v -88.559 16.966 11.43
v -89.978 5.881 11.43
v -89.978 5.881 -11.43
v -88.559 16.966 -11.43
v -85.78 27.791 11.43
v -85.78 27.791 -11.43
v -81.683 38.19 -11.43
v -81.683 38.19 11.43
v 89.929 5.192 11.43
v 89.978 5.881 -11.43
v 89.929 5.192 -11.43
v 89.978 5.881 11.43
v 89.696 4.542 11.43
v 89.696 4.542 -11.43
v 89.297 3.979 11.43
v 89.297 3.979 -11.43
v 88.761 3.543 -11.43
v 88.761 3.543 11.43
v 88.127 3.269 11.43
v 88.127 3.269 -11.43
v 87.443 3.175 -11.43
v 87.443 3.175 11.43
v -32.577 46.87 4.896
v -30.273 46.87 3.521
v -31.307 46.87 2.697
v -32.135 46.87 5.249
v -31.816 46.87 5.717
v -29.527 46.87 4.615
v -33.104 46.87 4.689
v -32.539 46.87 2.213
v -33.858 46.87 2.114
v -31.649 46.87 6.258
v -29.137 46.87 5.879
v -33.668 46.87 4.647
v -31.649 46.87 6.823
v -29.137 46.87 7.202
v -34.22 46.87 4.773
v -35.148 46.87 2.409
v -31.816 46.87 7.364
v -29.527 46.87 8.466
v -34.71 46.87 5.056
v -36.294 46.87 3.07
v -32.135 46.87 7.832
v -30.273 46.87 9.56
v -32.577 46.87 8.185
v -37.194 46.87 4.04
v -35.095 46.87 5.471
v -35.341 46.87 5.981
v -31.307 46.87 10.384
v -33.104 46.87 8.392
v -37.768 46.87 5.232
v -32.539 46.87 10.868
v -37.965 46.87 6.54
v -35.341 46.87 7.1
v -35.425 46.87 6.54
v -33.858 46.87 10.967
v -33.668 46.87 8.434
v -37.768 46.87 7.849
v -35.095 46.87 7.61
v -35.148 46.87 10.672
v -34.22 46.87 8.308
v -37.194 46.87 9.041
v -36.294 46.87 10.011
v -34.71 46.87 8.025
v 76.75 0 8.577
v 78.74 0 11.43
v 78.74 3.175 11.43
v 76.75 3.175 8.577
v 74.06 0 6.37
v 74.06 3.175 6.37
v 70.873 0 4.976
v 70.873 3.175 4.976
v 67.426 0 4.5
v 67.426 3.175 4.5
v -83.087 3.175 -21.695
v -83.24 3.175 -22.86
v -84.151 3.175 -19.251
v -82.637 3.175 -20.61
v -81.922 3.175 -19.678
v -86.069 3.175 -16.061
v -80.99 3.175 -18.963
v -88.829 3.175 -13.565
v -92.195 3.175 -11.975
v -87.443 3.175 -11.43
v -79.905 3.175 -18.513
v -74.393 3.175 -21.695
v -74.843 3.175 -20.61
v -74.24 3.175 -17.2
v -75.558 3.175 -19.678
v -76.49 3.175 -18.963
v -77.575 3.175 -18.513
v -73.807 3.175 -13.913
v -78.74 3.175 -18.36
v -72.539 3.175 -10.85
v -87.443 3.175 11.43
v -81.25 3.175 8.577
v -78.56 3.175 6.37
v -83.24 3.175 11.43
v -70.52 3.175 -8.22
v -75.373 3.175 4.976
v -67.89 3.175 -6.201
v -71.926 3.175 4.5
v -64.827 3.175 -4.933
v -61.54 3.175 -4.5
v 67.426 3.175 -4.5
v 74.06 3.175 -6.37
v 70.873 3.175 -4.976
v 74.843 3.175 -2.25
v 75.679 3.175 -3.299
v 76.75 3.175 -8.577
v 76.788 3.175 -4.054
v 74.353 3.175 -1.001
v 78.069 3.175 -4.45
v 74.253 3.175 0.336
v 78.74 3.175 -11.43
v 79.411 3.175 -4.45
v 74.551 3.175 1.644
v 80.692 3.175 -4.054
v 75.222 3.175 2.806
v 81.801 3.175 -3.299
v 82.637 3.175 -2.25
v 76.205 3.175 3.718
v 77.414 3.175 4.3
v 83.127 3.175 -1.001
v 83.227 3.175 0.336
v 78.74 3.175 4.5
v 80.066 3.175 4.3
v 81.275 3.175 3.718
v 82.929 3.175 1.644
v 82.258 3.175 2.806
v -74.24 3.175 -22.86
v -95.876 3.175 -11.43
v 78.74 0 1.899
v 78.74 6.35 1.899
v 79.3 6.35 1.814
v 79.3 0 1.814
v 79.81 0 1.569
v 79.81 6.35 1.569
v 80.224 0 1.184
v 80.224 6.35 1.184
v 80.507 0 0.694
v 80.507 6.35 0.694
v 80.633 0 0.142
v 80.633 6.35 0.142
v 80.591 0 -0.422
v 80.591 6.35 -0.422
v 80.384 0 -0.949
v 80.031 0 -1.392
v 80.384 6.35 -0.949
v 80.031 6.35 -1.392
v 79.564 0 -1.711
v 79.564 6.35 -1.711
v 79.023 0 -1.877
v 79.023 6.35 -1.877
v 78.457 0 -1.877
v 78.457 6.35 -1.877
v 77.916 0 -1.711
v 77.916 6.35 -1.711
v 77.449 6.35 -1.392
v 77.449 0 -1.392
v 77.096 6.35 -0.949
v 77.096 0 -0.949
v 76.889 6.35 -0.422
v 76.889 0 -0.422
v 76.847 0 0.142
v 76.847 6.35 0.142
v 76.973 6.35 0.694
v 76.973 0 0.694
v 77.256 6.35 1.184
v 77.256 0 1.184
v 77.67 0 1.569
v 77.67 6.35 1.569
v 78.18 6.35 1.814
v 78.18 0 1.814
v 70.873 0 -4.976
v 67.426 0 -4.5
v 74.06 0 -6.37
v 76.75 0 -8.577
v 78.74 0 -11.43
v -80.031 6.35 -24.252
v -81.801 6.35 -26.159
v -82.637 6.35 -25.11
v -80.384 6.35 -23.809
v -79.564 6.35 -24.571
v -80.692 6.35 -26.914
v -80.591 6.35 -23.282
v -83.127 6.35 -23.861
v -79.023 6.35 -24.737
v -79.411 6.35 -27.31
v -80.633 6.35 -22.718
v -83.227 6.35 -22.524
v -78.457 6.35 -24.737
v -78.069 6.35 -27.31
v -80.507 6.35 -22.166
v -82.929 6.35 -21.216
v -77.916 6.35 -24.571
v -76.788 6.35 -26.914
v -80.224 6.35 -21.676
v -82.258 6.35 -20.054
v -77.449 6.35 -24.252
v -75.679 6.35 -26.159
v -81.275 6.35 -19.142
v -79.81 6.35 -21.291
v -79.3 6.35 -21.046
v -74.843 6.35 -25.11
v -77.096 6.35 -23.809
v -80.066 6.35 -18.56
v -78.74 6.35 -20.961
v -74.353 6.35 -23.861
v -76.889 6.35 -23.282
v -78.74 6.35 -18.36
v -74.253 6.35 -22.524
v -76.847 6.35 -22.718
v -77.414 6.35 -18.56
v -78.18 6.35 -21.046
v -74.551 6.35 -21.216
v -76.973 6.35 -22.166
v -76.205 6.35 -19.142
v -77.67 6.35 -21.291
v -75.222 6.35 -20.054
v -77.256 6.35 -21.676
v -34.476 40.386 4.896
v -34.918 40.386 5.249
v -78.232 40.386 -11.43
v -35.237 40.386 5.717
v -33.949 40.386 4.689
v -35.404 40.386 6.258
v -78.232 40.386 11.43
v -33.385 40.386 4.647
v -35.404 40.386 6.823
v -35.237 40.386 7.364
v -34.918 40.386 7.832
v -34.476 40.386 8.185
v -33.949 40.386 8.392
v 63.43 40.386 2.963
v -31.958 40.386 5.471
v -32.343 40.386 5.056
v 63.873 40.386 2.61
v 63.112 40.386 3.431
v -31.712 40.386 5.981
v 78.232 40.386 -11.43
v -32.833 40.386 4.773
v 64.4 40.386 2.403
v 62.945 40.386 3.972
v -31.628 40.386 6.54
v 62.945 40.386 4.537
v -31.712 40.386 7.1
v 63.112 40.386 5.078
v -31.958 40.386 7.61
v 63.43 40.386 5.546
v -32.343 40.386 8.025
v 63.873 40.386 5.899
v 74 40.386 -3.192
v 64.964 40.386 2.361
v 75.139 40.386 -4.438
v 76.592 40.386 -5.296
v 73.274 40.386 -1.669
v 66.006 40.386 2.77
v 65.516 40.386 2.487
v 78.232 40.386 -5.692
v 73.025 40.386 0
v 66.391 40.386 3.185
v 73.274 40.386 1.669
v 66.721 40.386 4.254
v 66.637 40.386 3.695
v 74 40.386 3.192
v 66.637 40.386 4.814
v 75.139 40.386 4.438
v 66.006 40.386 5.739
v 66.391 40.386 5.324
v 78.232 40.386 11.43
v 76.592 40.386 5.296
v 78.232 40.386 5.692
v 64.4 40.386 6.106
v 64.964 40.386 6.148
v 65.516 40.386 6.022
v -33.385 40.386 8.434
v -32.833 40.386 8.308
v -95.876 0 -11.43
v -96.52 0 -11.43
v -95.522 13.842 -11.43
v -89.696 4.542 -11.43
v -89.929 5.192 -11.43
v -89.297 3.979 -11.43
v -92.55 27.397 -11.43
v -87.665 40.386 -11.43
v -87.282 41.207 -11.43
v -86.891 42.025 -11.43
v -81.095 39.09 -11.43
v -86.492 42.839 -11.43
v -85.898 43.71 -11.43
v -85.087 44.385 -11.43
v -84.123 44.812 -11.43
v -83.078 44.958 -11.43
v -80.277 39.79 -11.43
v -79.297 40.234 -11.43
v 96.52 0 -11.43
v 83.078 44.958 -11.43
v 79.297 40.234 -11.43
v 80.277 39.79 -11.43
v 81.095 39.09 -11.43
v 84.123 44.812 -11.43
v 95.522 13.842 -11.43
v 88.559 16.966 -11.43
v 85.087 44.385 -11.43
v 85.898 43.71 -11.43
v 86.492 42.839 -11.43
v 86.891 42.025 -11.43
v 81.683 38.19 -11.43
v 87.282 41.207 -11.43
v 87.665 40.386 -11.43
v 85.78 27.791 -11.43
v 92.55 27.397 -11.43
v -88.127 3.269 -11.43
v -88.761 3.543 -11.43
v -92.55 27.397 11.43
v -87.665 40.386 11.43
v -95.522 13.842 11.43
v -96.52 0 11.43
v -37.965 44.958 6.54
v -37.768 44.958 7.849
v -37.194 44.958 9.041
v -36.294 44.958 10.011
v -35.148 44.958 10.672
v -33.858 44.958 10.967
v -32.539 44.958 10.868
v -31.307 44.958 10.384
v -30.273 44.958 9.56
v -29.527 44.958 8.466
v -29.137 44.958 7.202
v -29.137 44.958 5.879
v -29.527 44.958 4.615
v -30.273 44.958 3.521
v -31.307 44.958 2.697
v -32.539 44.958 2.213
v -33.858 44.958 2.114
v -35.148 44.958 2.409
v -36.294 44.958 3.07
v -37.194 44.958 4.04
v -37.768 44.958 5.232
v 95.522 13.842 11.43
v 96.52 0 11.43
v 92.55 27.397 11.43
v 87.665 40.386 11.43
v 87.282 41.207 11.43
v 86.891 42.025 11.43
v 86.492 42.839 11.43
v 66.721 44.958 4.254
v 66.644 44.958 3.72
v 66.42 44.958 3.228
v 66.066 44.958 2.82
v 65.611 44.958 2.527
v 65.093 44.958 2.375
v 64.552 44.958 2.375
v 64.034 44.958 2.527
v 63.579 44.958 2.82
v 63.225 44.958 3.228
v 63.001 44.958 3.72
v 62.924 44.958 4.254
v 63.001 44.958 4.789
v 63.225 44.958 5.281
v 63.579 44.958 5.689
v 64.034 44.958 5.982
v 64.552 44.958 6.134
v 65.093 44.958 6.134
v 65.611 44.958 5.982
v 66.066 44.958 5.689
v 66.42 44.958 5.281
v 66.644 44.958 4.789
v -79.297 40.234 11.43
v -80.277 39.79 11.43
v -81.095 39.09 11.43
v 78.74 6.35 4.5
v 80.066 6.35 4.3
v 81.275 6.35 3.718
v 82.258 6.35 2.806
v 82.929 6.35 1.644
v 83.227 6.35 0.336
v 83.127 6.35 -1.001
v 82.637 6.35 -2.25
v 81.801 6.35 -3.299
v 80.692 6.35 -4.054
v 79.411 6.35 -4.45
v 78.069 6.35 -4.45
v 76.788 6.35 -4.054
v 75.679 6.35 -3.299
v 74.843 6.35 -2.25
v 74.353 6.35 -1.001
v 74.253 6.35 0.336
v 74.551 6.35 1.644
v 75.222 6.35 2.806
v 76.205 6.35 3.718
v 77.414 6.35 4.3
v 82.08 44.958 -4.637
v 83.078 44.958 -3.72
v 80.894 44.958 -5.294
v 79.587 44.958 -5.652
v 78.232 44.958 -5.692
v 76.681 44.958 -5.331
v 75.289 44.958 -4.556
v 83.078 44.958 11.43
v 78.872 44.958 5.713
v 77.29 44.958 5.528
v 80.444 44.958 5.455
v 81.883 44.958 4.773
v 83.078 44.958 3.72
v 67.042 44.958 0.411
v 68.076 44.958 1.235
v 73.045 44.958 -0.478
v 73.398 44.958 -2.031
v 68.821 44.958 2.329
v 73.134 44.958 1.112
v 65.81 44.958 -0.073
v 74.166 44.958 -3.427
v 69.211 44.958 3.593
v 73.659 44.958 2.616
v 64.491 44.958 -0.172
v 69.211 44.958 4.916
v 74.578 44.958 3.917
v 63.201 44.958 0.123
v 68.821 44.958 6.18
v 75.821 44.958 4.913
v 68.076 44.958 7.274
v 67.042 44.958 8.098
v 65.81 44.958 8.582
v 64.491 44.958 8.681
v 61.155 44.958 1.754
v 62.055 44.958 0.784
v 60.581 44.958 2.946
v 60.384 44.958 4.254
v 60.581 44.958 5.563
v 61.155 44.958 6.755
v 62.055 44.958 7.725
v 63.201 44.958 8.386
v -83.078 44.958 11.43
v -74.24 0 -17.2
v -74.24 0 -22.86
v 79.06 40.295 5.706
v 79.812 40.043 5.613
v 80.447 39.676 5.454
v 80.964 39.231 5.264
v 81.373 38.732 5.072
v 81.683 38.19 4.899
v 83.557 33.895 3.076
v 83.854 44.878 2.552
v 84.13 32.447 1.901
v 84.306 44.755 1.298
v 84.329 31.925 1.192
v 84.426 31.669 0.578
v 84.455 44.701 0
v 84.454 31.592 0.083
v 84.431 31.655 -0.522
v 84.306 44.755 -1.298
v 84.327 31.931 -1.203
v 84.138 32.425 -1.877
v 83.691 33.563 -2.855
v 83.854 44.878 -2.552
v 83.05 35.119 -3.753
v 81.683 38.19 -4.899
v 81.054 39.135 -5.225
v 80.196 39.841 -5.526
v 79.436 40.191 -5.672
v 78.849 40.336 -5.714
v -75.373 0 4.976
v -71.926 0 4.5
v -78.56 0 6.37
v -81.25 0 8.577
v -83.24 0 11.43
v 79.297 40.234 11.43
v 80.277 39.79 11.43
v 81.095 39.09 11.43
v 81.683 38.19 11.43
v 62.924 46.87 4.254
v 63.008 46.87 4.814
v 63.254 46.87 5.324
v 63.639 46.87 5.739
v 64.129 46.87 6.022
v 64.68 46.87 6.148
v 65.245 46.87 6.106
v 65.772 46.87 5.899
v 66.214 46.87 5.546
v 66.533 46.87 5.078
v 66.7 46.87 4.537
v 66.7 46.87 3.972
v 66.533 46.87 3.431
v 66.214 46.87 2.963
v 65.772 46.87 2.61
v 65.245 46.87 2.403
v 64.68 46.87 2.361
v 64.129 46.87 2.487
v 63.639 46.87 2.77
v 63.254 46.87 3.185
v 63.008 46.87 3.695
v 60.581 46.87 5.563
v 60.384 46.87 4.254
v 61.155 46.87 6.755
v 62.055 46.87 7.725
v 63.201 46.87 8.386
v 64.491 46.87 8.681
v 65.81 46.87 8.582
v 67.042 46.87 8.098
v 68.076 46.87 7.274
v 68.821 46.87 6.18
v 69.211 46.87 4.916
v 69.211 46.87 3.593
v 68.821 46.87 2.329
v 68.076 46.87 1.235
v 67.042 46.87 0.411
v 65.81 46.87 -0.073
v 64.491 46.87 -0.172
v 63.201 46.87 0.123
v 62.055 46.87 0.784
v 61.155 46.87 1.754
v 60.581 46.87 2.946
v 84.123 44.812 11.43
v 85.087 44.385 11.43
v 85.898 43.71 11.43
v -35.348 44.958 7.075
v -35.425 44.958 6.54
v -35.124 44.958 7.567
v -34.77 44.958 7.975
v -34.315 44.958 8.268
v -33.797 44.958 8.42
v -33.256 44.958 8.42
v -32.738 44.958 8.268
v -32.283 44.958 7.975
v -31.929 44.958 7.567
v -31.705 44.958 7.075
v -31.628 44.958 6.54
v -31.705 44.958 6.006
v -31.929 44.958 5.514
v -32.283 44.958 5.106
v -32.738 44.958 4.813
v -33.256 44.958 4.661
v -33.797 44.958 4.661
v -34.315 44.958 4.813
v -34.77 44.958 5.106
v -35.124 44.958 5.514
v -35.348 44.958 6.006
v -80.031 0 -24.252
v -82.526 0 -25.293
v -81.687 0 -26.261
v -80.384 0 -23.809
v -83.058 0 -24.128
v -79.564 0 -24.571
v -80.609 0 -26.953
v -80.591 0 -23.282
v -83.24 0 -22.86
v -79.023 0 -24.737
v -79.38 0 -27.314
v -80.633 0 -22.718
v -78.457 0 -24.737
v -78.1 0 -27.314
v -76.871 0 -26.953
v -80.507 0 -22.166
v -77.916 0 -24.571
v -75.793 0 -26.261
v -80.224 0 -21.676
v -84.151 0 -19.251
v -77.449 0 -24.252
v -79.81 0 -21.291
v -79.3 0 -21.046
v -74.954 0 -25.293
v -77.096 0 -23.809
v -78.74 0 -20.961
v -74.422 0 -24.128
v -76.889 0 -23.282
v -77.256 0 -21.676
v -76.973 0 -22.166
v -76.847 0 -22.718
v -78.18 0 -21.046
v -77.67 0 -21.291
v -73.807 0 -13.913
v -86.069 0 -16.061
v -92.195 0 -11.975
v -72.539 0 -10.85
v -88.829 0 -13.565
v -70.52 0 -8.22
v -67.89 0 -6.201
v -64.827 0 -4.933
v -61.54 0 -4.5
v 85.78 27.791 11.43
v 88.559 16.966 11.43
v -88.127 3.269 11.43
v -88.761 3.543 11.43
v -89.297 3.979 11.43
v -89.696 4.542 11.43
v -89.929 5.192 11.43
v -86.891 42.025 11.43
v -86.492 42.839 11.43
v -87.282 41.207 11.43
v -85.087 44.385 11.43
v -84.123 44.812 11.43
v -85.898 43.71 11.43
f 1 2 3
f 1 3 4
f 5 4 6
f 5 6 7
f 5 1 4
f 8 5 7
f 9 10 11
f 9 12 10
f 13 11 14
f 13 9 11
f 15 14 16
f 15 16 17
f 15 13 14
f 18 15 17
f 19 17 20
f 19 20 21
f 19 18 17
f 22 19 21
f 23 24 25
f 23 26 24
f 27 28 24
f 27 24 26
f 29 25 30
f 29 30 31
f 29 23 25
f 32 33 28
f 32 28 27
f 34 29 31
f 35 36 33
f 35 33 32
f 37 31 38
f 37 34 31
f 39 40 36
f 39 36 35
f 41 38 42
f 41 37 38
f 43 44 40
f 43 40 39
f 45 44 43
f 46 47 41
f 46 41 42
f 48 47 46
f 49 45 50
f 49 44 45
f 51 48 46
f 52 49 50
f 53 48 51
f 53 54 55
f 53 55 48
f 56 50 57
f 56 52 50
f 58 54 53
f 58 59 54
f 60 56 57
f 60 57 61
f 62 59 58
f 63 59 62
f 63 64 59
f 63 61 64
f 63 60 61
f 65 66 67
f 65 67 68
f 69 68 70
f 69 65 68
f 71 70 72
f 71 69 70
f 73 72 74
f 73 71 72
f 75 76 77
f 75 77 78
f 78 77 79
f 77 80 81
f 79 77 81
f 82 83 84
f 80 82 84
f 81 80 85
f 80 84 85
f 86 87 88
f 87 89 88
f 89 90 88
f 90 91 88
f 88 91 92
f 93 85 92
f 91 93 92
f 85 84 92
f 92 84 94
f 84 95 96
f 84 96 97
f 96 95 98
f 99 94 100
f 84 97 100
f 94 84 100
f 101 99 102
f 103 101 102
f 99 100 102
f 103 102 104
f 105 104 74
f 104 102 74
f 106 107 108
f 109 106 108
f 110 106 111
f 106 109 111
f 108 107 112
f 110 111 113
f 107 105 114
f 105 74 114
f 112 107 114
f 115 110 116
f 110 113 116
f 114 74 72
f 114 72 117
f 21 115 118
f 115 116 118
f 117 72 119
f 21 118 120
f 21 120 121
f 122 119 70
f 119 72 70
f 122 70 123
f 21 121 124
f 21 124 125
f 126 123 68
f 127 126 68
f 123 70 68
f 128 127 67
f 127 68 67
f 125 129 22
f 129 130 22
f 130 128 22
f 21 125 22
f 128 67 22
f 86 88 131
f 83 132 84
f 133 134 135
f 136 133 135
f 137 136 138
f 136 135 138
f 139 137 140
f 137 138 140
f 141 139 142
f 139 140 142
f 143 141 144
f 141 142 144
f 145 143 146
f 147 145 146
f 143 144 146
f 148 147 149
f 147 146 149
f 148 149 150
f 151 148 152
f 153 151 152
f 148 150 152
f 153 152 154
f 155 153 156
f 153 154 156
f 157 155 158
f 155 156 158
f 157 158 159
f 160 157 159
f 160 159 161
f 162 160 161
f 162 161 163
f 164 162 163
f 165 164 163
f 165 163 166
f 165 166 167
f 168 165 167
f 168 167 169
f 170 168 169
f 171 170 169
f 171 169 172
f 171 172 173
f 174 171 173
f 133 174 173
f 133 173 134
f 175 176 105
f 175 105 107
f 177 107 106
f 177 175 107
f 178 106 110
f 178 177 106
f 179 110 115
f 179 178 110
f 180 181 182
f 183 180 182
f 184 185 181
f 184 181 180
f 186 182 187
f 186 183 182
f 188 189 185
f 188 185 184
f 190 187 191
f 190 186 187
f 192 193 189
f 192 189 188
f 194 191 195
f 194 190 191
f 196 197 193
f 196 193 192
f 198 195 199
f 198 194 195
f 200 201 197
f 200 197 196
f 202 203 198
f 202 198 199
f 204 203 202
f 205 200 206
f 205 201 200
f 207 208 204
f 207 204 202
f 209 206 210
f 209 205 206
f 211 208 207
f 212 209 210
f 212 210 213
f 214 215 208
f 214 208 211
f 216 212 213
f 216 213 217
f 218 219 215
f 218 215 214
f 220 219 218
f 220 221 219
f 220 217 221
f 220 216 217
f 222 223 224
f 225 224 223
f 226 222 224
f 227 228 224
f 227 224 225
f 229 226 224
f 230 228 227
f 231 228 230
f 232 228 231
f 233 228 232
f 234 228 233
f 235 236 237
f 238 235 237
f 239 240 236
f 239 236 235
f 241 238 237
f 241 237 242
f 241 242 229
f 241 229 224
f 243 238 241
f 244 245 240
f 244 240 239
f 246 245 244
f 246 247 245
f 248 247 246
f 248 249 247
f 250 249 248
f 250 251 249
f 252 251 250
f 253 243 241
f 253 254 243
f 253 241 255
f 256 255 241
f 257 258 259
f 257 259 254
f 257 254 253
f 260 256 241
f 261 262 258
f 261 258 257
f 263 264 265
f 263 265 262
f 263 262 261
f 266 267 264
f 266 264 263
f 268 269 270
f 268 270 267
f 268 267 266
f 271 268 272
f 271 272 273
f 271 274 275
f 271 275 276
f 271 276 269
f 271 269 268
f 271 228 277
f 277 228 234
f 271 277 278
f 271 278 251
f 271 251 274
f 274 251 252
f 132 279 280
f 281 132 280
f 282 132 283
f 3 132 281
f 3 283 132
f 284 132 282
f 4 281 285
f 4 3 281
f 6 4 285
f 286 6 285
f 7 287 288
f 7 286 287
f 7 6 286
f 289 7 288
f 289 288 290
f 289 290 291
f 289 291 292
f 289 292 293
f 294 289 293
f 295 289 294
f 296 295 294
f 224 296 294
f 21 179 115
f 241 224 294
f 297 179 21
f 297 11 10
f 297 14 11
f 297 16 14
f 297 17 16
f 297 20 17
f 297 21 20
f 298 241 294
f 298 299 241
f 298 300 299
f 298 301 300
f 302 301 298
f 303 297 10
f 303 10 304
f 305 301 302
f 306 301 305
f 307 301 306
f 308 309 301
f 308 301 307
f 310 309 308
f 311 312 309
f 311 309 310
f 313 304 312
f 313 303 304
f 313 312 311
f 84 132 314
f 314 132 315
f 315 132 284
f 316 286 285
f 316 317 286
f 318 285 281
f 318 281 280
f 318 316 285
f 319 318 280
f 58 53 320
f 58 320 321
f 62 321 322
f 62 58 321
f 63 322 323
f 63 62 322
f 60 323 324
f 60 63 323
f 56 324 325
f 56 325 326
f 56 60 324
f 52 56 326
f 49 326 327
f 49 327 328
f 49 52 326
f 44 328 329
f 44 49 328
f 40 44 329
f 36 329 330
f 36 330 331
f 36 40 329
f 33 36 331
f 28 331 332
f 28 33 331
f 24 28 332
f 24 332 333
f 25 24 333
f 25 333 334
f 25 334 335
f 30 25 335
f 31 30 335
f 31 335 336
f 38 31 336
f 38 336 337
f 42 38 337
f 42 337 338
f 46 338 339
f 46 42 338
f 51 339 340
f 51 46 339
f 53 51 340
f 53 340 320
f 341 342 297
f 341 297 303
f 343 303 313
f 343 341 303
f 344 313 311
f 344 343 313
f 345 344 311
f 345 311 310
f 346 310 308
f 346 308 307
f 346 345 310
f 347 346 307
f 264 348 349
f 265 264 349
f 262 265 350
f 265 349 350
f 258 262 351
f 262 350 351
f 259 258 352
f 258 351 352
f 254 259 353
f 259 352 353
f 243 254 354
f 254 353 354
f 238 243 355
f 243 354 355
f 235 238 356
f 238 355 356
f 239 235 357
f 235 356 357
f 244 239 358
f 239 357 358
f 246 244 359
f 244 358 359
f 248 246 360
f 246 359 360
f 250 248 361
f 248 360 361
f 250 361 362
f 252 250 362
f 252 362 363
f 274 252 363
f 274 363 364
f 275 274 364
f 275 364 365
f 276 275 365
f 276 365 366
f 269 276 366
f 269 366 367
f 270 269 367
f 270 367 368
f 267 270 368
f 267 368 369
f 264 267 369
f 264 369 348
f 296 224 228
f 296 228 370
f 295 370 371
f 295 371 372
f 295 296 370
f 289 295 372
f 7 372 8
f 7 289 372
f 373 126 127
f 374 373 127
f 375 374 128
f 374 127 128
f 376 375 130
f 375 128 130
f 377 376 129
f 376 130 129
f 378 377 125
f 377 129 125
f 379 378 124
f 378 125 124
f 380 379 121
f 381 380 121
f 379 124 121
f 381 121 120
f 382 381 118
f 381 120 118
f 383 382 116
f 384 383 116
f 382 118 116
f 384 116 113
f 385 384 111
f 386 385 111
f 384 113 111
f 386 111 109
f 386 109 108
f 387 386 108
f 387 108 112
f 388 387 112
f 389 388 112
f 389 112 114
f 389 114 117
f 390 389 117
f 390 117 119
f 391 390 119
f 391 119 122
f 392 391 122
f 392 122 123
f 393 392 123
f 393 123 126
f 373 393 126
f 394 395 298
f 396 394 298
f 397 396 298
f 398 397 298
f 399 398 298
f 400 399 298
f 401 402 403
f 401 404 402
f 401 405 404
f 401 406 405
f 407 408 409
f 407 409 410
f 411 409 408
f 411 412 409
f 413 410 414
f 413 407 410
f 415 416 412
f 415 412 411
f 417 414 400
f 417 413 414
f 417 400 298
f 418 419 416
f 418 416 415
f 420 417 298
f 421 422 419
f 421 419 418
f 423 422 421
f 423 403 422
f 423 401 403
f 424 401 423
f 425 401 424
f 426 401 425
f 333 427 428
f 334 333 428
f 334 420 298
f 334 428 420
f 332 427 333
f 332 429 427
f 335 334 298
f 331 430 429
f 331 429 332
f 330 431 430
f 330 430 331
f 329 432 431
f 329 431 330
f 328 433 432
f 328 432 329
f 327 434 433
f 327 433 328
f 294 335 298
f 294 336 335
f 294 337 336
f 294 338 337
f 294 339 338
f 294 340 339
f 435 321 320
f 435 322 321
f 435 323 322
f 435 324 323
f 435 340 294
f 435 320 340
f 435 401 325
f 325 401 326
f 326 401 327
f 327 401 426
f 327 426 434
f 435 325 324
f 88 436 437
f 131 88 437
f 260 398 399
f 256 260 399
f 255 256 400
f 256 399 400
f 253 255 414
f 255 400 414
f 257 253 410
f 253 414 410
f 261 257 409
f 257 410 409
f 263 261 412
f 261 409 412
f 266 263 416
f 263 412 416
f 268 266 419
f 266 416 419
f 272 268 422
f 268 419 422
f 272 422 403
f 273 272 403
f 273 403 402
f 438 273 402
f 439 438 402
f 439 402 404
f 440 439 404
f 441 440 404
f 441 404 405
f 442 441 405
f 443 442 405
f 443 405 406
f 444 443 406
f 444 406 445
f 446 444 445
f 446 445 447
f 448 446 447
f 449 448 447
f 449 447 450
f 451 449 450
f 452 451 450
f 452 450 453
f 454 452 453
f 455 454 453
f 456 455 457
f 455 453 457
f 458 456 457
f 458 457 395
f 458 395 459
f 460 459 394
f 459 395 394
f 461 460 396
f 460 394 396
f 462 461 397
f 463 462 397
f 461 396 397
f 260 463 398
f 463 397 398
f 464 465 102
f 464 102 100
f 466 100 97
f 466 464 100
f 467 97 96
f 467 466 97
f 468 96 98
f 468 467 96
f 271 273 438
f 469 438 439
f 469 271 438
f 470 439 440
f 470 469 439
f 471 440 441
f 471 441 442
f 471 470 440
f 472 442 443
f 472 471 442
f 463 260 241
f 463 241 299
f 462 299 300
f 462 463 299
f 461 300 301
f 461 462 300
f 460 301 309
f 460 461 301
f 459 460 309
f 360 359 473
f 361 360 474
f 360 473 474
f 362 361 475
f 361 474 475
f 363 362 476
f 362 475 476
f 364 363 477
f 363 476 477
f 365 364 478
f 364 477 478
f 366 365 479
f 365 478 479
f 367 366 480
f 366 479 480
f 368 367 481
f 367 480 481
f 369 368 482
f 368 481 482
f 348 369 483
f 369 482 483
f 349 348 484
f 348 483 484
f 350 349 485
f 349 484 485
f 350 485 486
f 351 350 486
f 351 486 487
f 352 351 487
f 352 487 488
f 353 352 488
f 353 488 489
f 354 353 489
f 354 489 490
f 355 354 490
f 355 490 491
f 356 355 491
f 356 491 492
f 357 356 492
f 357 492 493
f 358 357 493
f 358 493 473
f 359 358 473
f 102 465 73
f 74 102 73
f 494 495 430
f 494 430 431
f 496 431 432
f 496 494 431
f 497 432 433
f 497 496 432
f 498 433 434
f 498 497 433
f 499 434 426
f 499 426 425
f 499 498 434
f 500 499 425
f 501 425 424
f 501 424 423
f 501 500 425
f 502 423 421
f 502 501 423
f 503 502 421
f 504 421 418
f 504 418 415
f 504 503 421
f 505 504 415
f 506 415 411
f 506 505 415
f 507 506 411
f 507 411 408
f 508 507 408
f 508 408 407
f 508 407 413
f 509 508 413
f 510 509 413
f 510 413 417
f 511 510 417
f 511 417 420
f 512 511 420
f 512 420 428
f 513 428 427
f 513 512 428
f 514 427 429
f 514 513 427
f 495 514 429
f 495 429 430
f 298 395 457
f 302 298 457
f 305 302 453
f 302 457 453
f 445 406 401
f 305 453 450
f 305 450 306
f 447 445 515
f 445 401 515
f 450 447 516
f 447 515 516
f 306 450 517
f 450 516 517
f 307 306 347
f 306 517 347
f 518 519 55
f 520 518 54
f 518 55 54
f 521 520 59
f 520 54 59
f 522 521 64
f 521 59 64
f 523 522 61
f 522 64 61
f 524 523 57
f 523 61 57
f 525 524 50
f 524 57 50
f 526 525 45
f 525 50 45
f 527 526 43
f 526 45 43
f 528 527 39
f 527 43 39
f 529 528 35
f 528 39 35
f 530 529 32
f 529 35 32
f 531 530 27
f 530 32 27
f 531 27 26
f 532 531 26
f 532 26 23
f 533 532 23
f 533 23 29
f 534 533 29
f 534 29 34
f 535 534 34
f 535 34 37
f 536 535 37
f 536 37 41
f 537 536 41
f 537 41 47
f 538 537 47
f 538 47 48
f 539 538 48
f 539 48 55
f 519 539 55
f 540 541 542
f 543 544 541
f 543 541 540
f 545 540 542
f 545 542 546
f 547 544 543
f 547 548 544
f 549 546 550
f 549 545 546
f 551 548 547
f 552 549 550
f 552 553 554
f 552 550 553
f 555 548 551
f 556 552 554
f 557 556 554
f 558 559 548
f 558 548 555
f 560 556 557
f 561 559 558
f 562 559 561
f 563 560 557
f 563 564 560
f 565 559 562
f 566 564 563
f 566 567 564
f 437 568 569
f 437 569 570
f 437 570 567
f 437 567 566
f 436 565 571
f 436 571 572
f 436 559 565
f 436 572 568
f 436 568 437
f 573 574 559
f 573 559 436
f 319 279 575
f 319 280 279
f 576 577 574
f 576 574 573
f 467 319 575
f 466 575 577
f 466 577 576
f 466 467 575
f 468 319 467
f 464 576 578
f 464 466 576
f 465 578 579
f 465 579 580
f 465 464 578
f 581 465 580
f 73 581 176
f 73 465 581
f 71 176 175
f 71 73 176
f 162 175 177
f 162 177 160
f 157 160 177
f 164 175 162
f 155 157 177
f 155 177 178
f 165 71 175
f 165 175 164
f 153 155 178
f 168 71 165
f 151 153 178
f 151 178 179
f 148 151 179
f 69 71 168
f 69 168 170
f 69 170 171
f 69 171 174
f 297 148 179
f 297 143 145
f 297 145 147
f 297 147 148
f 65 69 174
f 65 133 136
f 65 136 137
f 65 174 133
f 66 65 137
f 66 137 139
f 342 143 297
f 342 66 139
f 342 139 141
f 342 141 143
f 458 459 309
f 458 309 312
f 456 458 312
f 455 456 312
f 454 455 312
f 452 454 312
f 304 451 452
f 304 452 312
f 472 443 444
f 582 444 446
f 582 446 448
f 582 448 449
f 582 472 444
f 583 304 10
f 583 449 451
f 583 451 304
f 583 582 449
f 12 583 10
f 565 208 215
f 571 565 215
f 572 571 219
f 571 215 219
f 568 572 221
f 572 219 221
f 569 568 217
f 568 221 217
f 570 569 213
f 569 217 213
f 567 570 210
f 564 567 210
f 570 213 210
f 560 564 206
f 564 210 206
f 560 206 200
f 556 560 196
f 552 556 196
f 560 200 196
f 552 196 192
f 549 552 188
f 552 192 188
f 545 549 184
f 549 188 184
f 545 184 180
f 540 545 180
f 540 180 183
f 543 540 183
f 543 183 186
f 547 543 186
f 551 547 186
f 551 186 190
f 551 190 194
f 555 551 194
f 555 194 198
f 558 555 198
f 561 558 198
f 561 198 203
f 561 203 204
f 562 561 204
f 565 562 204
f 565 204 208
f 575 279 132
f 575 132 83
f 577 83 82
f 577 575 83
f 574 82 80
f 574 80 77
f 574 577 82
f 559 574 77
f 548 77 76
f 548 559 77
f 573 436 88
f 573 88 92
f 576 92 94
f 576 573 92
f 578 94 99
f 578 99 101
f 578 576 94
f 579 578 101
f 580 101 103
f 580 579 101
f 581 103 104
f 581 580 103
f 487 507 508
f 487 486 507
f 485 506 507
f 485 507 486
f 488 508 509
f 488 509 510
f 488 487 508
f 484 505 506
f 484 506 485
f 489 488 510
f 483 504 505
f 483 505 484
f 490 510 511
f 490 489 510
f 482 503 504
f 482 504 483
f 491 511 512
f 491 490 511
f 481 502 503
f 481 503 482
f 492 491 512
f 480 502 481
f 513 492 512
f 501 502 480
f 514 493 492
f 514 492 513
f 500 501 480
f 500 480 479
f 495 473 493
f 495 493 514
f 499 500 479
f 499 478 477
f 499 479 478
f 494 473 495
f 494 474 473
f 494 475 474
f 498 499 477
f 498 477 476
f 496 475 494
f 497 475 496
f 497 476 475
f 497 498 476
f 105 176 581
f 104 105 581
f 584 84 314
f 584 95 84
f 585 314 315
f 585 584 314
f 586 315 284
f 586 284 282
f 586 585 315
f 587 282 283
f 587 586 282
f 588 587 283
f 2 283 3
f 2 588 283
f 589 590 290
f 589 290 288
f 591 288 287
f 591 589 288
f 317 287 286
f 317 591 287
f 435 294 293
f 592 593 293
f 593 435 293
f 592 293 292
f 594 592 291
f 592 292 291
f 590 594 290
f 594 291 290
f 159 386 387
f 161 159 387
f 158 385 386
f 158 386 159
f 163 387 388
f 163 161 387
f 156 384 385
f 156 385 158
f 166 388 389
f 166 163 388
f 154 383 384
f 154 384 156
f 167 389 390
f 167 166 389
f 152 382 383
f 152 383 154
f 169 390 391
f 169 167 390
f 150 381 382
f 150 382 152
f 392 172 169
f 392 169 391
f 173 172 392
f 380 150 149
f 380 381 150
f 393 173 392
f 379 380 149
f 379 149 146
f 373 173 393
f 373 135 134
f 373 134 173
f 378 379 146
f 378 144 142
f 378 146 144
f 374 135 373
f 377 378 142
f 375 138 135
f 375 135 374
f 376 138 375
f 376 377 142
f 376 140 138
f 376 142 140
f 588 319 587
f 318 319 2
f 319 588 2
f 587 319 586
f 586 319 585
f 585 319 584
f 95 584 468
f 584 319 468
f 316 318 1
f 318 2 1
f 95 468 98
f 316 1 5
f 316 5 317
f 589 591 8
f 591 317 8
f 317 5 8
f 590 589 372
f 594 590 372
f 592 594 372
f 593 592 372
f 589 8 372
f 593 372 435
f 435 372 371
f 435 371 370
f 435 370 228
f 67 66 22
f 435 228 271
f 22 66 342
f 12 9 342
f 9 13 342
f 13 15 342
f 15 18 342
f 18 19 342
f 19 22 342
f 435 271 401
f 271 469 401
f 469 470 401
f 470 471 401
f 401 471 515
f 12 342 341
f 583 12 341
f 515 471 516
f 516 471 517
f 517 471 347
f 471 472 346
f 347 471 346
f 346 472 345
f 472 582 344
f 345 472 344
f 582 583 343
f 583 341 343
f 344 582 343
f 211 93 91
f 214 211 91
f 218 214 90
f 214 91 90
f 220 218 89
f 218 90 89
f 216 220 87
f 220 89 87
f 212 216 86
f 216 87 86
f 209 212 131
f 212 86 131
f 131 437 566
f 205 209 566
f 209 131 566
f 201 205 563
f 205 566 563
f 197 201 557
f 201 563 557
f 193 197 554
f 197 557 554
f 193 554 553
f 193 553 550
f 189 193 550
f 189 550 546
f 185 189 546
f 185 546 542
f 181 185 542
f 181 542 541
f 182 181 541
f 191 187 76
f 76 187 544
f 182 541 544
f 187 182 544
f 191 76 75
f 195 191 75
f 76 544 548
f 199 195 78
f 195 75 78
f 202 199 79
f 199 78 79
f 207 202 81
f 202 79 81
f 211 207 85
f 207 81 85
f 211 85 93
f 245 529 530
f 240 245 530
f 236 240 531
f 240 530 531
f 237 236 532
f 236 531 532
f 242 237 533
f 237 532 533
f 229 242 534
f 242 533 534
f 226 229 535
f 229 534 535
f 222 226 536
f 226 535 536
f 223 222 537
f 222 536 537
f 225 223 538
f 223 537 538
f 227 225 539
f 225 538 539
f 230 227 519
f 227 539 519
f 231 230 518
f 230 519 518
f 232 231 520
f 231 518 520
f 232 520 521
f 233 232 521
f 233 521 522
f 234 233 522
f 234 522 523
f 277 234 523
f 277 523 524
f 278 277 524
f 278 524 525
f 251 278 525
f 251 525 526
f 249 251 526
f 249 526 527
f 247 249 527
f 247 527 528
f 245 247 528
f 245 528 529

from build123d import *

# Parameters (mm, degrees)
SKETCH1_R                  = 4.5
BOSS_EXTRUDE1_DEPTH        = 6.35
BOSS_EXTRUDE1_2_DEPTH      = 6.35
BOSS_EXTRUDE2_DEPTH        = 3.175
SKETCH5_W                  = 4.5
SKETCH5_H                  = 3.175
BOSS_EXTRUDE3_DEPTH        = 11.43
F_6_CLEARANCE_HOLE1_D      = 3.7973
FILLET1_R                  = 2.54
FILLET2_R                  = 3.81
FILLET3_R                  = 12.7
CUT_EXTRUDE1_REACH         = 111.936
SKETCH10_R                 = 5.715
F_6_CLEARANCE_HOLE2_REACH  = 143.713
F_6_CLEARANCE_HOLE2_BORE_R = 1.89865
BOSS_EXTRUDE5_START        = 1.912
SKETCH13_R                 = 4.43865
SKETCH13_R_2               = 1.89865
BOSS_EXTRUDE5_DEPTH        = 1.912


with BuildPart() as part:
    # Sketch1 → Boss-Extrude1 (new body)
    with BuildSketch(Plane(origin=(0, 0, 0), x_dir=(1, 0, 0), z_dir=(0, 1, 0))):
        with Locations(Location((78.74, 0, 0), (0, 0, 270))):
            Circle(SKETCH1_R)
    extrude(amount=BOSS_EXTRUDE1_DEPTH)



with BuildPart() as body_2:
    # Sketch1 → Boss-Extrude1 2 (new body)
    with BuildSketch(Plane(origin=(0, 0, 0), x_dir=(1, 0, 0), z_dir=(0, 1, 0))):
        with Locations(Location((-78.74, 22.86, 0), (0, 0, 270))):
            Circle(SKETCH1_R)
    extrude(amount=BOSS_EXTRUDE1_2_DEPTH)


with BuildPart() as part_1:
    add(part.part)

    add(body_2.part)  # Boss-Extrude2 merges body 2
    # Sketch2 → Boss-Extrude2 (add)
    with BuildSketch(Plane(origin=(0, 0, 0), x_dir=(1, 0, 0), z_dir=(0, 1, 0))):
        with BuildLine():
            ThreePointArc((-74.24, 22.86), (-78.74, 18.36), (-83.24, 22.86))
            Line((-83.24, 22.86), (-83.24, -4.5))
            Line((-83.24, -4.5), (78.74, -4.5))
            ThreePointArc((78.74, -4.5), (74.24, 0), (78.74, 4.5))
            Line((78.74, 4.5), (-74.24, 4.5))
            Line((-74.24, 4.5), (-74.24, 22.86))
        make_face()
    extrude(amount=BOSS_EXTRUDE2_DEPTH)

    # Sketch5 → Boss-Extrude3 (add, symmetric)
    with BuildSketch(Plane.XY):
        with BuildLine():
            ThreePointArc((-90.114084776, 3.175), (-87.371075104, 22.291795245), (-80.620096155, 40.386))
            Line((-80.620096155, 40.386), (-87.664596069, 40.386))
            ThreePointArc((-87.664596069, 40.386), (-94.280160195, 20.672730678), (-96.52, 0))
            Line((-96.52, 0), (-83.24, 0))
            Line((-83.24, 0), (-83.24, 3.175))
            Line((-83.24, 3.175), (-90.114084776, 3.175))
        make_face()
        with BuildLine():
            Line((80.620096155, 40.386), (87.664596069, 40.386))
            ThreePointArc((87.664596069, 40.386), (86.567546752, 42.686886152), (85.41012022, 44.958))
            Line((85.41012022, 44.958), (78.162696576, 44.958))
            ThreePointArc((78.162696576, 44.958), (79.424301148, 42.689685958), (80.620096155, 40.386))
        make_face()
        with BuildLine():
            Line((-87.664596069, 40.386), (-80.620096155, 40.386))
            ThreePointArc((-80.620096155, 40.386), (-79.424301148, 42.689685958), (-78.162696576, 44.958))
            Line((-78.162696576, 44.958), (-85.41012022, 44.958))
            ThreePointArc((-85.41012022, 44.958), (-86.567546752, 42.686886152), (-87.664596069, 40.386))
        make_face()
        with BuildLine():
            Line((-80.620096155, 40.386), (80.620096155, 40.386))
            ThreePointArc((80.620096155, 40.386), (79.424301148, 42.689685958), (78.162696576, 44.958))
            Line((78.162696576, 44.958), (-78.162696576, 44.958))
            ThreePointArc((-78.162696576, 44.958), (-79.424301148, 42.689685958), (-80.620096155, 40.386))
        make_face()
        with Locations((80.99, 1.5875)):
            Rectangle(SKETCH5_W, SKETCH5_H)
        with BuildLine():
            Line((83.24, 3.175), (83.24, 0))
            Line((83.24, 0), (96.52, 0))
            ThreePointArc((96.52, 0), (94.280160195, 20.672730678), (87.664596069, 40.386))
            Line((87.664596069, 40.386), (80.620096155, 40.386))
            ThreePointArc((80.620096155, 40.386), (87.371075104, 22.291795245), (90.114084776, 3.175))
            Line((90.114084776, 3.175), (83.24, 3.175))
        make_face()
    extrude(amount=BOSS_EXTRUDE3_DEPTH, both=True)

    # #6 Clearance Hole1 (through all)
    with Locations(Plane(origin=(-78.74, 0, -22.86), x_dir=(0, 0, -1), z_dir=(0, -1, 0))):
        with Locations((0, 0), (-22.86, 157.48)):
            Hole(F_6_CLEARANCE_HOLE1_D / 2)

    # Fillet1
    fillet1_edges = [part_1.edges().sort_by_distance(p)[0] for p in [
        (-90.114084776, 3.175, 0),
        (90.114084776, 3.175, 0),
    ]]
    fillet(fillet1_edges, radius=FILLET1_R)

    # Fillet2
    # the kernel refuses this fillet: 3.81 mm, written as the material it adds along each edge
    with BuildSketch(Plane(origin=(80.620096155, 40.386, 5.835732073), x_dir=(-1, 0, 0), z_dir=(0, 0, -1))) as fillet2_piece_1_section:
        with BuildLine():
            CenterArc((2.388096155, -3.81), FILLET2_R, 90, 64.942384582)
            ThreePointArc((-1.06331561, -2.196352941), (-0.539087936, -1.094579337), (0, 0))
            Line((0, 0), (2.388096155, 0))
        make_face()
    fillet2_piece_1 = extrude(amount=17.265732073, mode=Mode.PRIVATE)
    fillet2_piece_1 = fillet2_piece_1 - Plane(origin=(78.74, 40.386, 0), x_dir=(0, 0, 1), z_dir=(0, 1, 0)) * Cylinder(1.89865, 45, mode=Mode.PRIVATE)
    add(fillet2_piece_1)
    with BuildSketch(Plane(origin=(80.620096155, 40.386, 11.43), x_dir=(-1, 0, 0), z_dir=(0, 0, -1))) as fillet2_piece_2_section:
        with BuildLine():
            CenterArc((2.388096155, -3.81), FILLET2_R, 90, 64.942384582)
            ThreePointArc((-1.06331561, -2.196352941), (-0.539087936, -1.094579337), (0, 0))
            Line((0, 0), (2.388096155, 0))
        make_face()
    fillet2_piece_2 = extrude(amount=17.265732073, mode=Mode.PRIVATE)
    fillet2_piece_2 = fillet2_piece_2 - Plane(origin=(78.74, 40.386, 0), x_dir=(0, 0, 1), z_dir=(0, 1, 0)) * Cylinder(1.89865, 45, mode=Mode.PRIVATE)
    add(fillet2_piece_2)
    with BuildSketch(Plane(origin=(-80.620096155, 40.386, -11.43), x_dir=(-0.4357482606496553, -0.900068582576239, 0), z_dir=(0, 0, 1))) as fillet2_piece_3:
        with BuildLine():
            CenterArc((2.388652554, 3.809651194), FILLET2_R, 205.832916425, 64.942384582)
            Line((-1.040608746, 2.149450321), (0, 0))
            ThreePointArc((0, 0), (1.220103103, -0.008255072), (2.440206206, 0))
        make_face()
    extrude(amount=22.86)
    # the kernel refuses this fillet: 3.81 mm, written as the material it takes off along each edge
    with BuildSketch(Plane(origin=(-85.41012022, 44.958, -17.378402089), x_dir=(-0.4548470974381097, -0.8905695469485393, 0), z_dir=(0, 0, 1))) as fillet2_2_piece_1:
        with BuildLine():
            CenterArc((2.332399766, 3.809710574), FILLET2_R, 207.055096642, 63.651134119)
            Line((-1.060670207, 2.076743133), (0, 0))
            ThreePointArc((0, 0), (1.189680418, -0.007332124), (2.379360836, 0))
        make_face()
    extrude(amount=34.756804178, mode=Mode.SUBTRACT)
    with BuildSketch(Plane(origin=(85.41012022, 44.958, 17.378402089), x_dir=(-1, 0, 0), z_dir=(0, 0, -1))) as fillet2_2_piece_2:
        with BuildLine():
            CenterArc((2.331926956, -3.81), FILLET2_R, 90, 63.651134119)
            ThreePointArc((-1.08224537, -2.118986301), (-0.547652451, -1.056158155), (0, 0))
            Line((0, 0), (2.331926956, 0))
        make_face()
    extrude(amount=34.756804178, mode=Mode.SUBTRACT)

    # Fillet3
    # the kernel refuses this fillet: 12.7 mm, written as the material it adds along each edge
    with BuildSketch(Plane(origin=(78.74, 0, -4.5), x_dir=(0, 0, -1), z_dir=(0, 1, 0)), Plane(origin=(-83.24, 0, 4.5), x_dir=(0, 0, 1), z_dir=(0, 1, 0))) as fillet3_piece_1:
        with BuildLine():
            CenterArc((12.7, 11.313580335), FILLET3_R, 180, 62.978120887)
            Line((0, 11.313580335), (0, 0))
            Line((0, 0), (6.93, 0))
        make_face()
    extrude(amount=3.175)
    with BuildSketch(Plane(origin=(78.74, 0, 4.5), x_dir=(0, 0, 1), z_dir=(0, 1, 0))) as fillet3_piece_2:
        with BuildLine():
            CenterArc((12.7, -11.313580335), FILLET3_R, 117.021879113, 62.978120887)
            Line((0, -11.313580335), (0, 0))
            Line((0, 0), (6.93, 0))
        make_face()
    extrude(amount=3.175)
    with BuildSketch(Plane(origin=(-74.24, 0, -4.5), x_dir=(1, 0, 0), z_dir=(0, 1, 0))) as fillet3_piece_3:
        with BuildLine():
            CenterArc((FILLET3_R, FILLET3_R), FILLET3_R, 180, 90)
            Line((0, FILLET3_R), (0, 0))
            Line((0, 0), (FILLET3_R, 0))
        make_face()
    extrude(amount=3.175)
    with BuildSketch(Plane(origin=(-83.24, 0, -11.43), x_dir=(-1, 0, 0), z_dir=(0, 1, 0))) as fillet3_piece_4:
        with BuildLine():
            CenterArc((12.636340451, -12.7), FILLET3_R, 90, 84.260829523)
            Line((0, -11.43), (0, 0))
            Line((0, 0), (12.636340451, 0))
        make_face()
    extrude(amount=3.175)

    # Cut-Extrude1: up to this face of the body (flat: up to its plane)
    cut_extrude1_end = Plane(part_1.part.faces().sort_by_distance((78.74, 6.35, -4.372720779))[0])
    # Sketch10 → Cut-Extrude1 (cut, up to the picked face)
    with BuildSketch(Plane(origin=(0, 44.958, 0), x_dir=(1, 0, 0), z_dir=(0, 1, 0)), mode=Mode.PRIVATE) as cut_extrude1_sk1:
        with Locations(Location((78.74, 0, 0), (0, 0, 95.099688914))):
            Circle(SKETCH10_R)
    cut_extrude1_tool1 = split(extrude(cut_extrude1_sk1.sketch, amount=-CUT_EXTRUDE1_REACH, mode=Mode.PRIVATE), bisect_by=cut_extrude1_end, keep=Keep.BOTH, mode=Mode.PRIVATE)
    add(cut_extrude1_tool1.solids().sort_by(Axis((78.74, 44.958, 0), (0, -1, 0)))[0], mode=Mode.SUBTRACT)

    # #6 Clearance Hole2 bore (on position points) → #6 Clearance Hole2 (cut, up to next)
    with BuildSketch(Plane(origin=(-33.5265, 44.958, 6.5405), x_dir=(1, 0, 0), z_dir=(0, 1, 0)), mode=Mode.PRIVATE) as f_6_clearance_hole2_sk1:
        Circle(F_6_CLEARANCE_HOLE2_BORE_R)
    f_6_clearance_hole2_tool1 = extrude(f_6_clearance_hole2_sk1.sketch, amount=-F_6_CLEARANCE_HOLE2_REACH, mode=Mode.PRIVATE) & part_1.part
    # #6 Clearance Hole2 bore (on position points) → #6 Clearance Hole2 (cut, up to next)
    with BuildSketch(Plane(origin=(-33.5265, 44.958, 6.5405), x_dir=(1, 0, 0), z_dir=(0, 1, 0)), mode=Mode.PRIVATE) as f_6_clearance_hole2_sk2:
        with Locations((98.3488, 2.286)):
            Circle(F_6_CLEARANCE_HOLE2_BORE_R)
    f_6_clearance_hole2_tool2 = extrude(f_6_clearance_hole2_sk2.sketch, amount=-F_6_CLEARANCE_HOLE2_REACH, mode=Mode.PRIVATE) & part_1.part
    add(f_6_clearance_hole2_tool1.solids().sort_by_distance((-33.5265, 44.958, 6.5405))[0], mode=Mode.SUBTRACT)
    add(f_6_clearance_hole2_tool2.solids().sort_by_distance((64.8223, 44.958, 4.2545))[0], mode=Mode.SUBTRACT)

    # Sketch13 → Boss-Extrude5 (add)
    # profile 1 of 2: a face of its own
    with BuildSketch(Plane(origin=(0, 44.958, 0), x_dir=(1, 0, 0), z_dir=(0, 1, 0)).offset(BOSS_EXTRUDE5_START)):
        with Locations(Location((-33.5265, -6.5405, 0), (0, 0, 180))):
            Circle(SKETCH13_R)
        with Locations(Location((-33.5265, -6.5405, 0), (0, 0, 180))):
            Circle(SKETCH13_R_2, mode=Mode.SUBTRACT)
    # profile 2 of 2: a face of its own
    with BuildSketch(Plane(origin=(0, 44.958, 0), x_dir=(1, 0, 0), z_dir=(0, 1, 0)).offset(BOSS_EXTRUDE5_START)):
        with Locations(Location((64.8223, -4.2545, 0), (0, 0, 180))):
            Circle(SKETCH13_R)
        with Locations(Location((64.8223, -4.2545, 0), (0, 0, 180))):
            Circle(SKETCH13_R_2, mode=Mode.SUBTRACT)
    extrude(amount=-BOSS_EXTRUDE5_DEPTH)


solid = part_1.part
